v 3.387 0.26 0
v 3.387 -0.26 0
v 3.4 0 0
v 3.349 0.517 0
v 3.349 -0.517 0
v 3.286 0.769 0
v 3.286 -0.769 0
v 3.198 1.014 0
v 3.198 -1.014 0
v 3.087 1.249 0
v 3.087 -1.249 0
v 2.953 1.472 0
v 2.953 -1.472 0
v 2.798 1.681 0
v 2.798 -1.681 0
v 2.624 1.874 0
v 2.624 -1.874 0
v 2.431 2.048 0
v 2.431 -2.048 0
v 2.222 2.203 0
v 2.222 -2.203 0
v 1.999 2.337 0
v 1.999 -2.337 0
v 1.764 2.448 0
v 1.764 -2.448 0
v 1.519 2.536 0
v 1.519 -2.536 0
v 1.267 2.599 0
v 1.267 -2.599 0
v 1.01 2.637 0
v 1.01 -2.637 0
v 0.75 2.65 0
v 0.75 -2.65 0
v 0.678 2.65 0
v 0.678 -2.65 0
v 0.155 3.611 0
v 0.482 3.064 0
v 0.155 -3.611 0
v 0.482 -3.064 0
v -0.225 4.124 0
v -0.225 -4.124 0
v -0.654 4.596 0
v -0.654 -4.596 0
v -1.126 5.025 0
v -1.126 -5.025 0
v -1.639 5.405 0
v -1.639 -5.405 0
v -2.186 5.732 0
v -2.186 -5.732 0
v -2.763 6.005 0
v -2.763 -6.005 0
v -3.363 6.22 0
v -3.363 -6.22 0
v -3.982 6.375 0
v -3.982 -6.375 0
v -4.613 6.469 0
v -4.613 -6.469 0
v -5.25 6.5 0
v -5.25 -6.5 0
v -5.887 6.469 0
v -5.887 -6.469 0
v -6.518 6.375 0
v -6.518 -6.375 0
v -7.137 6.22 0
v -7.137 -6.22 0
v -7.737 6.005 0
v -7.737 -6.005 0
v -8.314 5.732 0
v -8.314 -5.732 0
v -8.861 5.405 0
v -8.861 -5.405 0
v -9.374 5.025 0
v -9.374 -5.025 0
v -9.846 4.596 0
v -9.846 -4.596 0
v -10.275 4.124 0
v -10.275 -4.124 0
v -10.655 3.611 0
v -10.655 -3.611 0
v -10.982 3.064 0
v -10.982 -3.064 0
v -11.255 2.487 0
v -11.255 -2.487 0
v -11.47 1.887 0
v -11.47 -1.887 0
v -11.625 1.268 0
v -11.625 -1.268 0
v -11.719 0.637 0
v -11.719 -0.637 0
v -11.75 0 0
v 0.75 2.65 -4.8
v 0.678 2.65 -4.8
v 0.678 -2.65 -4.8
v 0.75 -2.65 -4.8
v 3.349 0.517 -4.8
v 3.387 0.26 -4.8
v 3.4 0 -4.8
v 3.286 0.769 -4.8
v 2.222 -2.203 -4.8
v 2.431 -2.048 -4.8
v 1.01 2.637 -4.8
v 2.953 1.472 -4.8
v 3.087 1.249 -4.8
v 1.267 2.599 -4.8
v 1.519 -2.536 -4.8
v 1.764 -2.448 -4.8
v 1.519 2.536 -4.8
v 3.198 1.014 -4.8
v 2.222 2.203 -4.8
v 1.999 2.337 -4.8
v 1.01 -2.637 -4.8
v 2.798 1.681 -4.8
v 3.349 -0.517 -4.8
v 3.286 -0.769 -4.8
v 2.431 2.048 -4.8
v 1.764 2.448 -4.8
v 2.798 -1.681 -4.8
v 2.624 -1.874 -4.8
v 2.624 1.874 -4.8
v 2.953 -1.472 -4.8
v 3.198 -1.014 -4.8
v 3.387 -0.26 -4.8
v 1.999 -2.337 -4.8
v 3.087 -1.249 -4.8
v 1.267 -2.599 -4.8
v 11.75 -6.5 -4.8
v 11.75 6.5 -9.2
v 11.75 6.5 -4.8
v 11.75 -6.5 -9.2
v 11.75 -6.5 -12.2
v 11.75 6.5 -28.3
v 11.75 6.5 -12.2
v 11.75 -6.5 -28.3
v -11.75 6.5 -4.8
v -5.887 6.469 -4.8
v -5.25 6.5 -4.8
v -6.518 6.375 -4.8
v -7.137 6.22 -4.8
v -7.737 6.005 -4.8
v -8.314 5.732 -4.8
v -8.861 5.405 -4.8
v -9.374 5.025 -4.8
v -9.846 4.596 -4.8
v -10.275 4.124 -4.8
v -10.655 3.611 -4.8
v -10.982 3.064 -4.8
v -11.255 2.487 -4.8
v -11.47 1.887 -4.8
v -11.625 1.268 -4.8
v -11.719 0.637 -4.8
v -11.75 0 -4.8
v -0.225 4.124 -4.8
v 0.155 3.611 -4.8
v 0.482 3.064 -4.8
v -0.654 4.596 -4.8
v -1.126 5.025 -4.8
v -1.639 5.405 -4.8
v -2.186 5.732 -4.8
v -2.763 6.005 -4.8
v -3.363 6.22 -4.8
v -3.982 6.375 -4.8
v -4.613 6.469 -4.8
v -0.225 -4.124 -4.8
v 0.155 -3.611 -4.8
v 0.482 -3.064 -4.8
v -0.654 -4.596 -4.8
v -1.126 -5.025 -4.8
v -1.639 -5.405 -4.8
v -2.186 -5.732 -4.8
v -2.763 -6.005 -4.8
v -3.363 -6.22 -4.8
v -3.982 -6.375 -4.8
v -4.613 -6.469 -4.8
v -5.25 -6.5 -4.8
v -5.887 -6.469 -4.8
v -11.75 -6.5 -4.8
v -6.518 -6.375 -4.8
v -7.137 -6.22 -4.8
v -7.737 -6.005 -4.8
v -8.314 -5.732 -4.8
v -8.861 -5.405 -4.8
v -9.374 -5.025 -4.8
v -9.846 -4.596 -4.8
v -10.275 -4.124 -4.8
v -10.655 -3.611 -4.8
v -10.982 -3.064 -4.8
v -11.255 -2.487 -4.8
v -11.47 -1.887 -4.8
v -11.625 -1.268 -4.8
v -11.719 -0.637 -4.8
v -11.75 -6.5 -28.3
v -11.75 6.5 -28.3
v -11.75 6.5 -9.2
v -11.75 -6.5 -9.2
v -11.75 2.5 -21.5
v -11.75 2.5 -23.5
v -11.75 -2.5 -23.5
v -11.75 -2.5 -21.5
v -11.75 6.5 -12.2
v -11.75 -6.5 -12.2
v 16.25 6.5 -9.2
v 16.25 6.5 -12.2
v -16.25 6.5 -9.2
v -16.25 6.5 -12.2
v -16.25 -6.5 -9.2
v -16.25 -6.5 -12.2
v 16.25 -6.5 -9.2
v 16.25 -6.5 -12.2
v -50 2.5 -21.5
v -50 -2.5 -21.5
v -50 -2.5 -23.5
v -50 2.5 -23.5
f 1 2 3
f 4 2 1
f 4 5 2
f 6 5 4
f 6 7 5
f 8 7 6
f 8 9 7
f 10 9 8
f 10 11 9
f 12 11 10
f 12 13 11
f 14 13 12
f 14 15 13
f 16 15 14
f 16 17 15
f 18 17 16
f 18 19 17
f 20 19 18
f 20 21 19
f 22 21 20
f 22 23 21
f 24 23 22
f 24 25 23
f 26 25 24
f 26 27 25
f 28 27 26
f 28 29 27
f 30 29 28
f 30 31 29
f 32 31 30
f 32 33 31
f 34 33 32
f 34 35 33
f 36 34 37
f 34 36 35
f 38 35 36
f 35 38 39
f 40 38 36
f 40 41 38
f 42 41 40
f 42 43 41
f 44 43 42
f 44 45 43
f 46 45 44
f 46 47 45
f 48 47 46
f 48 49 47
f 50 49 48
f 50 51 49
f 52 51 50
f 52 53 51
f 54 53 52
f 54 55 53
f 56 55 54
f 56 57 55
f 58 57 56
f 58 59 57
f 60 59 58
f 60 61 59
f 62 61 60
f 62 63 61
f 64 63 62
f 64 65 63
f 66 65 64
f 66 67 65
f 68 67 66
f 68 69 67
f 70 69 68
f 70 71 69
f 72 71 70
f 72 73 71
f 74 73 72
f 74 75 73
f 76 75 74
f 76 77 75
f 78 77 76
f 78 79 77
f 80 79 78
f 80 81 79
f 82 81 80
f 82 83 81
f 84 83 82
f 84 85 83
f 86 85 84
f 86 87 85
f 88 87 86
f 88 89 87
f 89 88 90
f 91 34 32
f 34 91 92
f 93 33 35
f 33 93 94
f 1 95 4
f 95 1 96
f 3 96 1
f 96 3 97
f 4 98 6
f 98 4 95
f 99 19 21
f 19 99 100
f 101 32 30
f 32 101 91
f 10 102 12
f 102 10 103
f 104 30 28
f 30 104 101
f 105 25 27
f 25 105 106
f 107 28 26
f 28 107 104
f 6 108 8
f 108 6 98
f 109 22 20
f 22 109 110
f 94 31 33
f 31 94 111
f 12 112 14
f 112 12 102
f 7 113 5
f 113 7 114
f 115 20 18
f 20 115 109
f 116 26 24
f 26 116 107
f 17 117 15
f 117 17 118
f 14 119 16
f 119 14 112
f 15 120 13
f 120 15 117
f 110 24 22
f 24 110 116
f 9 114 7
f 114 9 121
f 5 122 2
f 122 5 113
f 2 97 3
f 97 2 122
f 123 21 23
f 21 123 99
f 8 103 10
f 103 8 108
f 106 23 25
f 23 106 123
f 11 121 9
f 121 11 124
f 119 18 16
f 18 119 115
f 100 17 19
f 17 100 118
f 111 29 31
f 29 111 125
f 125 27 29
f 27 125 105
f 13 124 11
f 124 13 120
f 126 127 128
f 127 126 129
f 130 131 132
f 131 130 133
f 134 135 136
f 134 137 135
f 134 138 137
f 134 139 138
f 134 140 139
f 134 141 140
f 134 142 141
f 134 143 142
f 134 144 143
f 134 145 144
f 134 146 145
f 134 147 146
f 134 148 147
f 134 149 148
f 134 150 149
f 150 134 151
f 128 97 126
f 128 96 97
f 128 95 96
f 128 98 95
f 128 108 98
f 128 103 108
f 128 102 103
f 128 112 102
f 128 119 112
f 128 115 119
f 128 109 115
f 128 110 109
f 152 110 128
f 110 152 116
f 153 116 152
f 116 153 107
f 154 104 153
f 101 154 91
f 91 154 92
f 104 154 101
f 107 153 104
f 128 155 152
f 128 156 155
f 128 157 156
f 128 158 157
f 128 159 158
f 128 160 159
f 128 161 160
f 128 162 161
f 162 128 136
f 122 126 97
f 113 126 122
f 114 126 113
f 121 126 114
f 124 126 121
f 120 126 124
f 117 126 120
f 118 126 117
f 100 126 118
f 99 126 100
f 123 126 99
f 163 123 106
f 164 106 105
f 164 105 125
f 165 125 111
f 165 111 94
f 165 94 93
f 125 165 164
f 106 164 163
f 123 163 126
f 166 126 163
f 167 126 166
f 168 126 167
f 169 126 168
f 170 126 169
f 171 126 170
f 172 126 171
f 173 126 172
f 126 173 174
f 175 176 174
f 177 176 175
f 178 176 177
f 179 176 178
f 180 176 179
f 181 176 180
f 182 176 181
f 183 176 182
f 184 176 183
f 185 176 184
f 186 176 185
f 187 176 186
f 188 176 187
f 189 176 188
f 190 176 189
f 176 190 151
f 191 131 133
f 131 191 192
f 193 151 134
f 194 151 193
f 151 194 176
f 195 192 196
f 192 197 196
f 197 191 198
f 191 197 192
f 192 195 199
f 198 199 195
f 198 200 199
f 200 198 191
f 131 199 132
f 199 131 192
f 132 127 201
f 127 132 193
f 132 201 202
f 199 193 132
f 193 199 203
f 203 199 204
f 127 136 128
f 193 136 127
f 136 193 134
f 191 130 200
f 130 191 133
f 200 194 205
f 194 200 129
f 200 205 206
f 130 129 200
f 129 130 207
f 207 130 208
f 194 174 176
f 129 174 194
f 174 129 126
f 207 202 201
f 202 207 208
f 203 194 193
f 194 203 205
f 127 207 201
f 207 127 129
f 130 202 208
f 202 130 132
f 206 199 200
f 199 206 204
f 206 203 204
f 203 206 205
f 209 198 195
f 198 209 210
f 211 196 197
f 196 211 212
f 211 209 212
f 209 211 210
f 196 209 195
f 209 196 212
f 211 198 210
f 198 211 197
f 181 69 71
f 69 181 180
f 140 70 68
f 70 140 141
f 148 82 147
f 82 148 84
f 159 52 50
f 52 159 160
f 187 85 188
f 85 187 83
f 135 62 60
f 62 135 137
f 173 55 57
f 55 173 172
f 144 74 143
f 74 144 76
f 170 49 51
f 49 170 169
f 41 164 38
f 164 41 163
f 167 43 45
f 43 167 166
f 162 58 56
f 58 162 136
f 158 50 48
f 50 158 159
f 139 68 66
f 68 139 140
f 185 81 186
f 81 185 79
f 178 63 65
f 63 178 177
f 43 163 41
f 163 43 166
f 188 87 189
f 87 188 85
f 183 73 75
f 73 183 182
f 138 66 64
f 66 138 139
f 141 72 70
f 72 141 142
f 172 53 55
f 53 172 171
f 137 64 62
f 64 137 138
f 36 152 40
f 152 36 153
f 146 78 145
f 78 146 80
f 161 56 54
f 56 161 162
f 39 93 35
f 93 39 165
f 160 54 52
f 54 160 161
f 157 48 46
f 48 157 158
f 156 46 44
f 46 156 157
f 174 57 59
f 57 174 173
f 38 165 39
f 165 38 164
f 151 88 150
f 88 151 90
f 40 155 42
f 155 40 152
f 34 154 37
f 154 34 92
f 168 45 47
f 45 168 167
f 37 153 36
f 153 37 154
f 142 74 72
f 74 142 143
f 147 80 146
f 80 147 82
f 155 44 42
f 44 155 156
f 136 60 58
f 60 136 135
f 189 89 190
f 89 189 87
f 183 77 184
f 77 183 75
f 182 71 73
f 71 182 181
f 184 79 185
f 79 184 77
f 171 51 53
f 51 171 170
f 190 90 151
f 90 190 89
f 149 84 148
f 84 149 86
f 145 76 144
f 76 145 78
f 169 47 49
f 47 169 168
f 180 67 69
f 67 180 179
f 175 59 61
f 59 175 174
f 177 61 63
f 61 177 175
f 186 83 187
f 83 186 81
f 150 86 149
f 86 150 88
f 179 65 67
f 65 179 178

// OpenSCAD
// file: Common/Util/Common/Util/Shapes/Flat_Ring_Segment.scad
// Auther: Tobias Grundtvig
// Date: Oct 1, 2020
//
// A segment of a flat ring

use <Pie_2D.scad>
use <Flat_Ring.scad>

Flat_Ring_Segment(  inner_diameter=20,
                    outer_diameter=25,
                    height=5,
                    from_angle=45,
                    to_angle=135,
                    t_y="neg",
                    angular_resolution=32);

module Flat_Ring_Segment(   inner_diameter,
                            outer_diameter,
                            height,
                            from_angle,
                            to_angle,
                            t_x="center",
                            t_y="center",
                            t_z="center",
                            angular_resolution=32)
{
    tx = t_x == "neg" ? -outer_diameter/2 : 
            t_x == "pos" ? outer_diameter/2 : 0;
    ty = t_y == "neg" ? -outer_diameter/2 : 
            t_y == "pos" ? outer_diameter/2 : 0;
    tz = t_z == "neg" ? -height/2 : 
            t_z == "pos" ? height/2 : 0;
    translate([tx, ty, tz])
    intersection()
    {
        linear_extrude(height=height, center=true)
        {
            Pie_2D
            (
                diameter=outer_diameter*2,
                from_angle=from_angle,
                to_angle=to_angle,
                steps = 8
            );
        }
        Flat_Ring(  inner_diameter=inner_diameter,
                    outer_diameter=outer_diameter,
                    height=height,
                    angular_resolution=angular_resolution);
    }
}
// file: Common/Util/Common/Util/Shapes/Torus_Segment.scad
// Auther: Tobias Grundtvig
// Date: Oct 1, 2020
//
// A segment of a flat ring

use <Pie_2D.scad>
use <Torus.scad>

Torus_Segment(  small_diameter=10,
                big_diameter=40,
                from_angle=45,
                to_angle=90,
                t_y="neg",
                angular_resolution=64);

module Torus_Segment(   small_diameter,
                        big_diameter,
                        from_angle,
                        to_angle,
                        t_x="center",
                        t_y="center",
                        t_z="center",
                        angular_resolution=32)
{
    tx = t_x == "neg" ? -0.5*big_diameter - 0.5*small_diameter : 
            t_x == "pos" ? 0.5*big_diameter + 0.5*small_diameter : 0;
    ty = t_y == "neg" ? -0.5*big_diameter - 0.5*small_diameter : 
            t_y == "pos" ? 0.5*big_diameter + 0.5*small_diameter : 0;
    tz = t_z == "neg" ? -0.5*small_diameter : 
            t_z == "pos" ? 0.5*small_diameter : 0;
    translate([tx, ty, tz])
    intersection()
    {
        linear_extrude(height=small_diameter+2, center=true)
        {
            Pie_2D
            (
                diameter=(small_diameter+big_diameter)*2,
                from_angle=from_angle,
                to_angle=to_angle,
                steps = 8
            );
        }
        Torus(  small_diameter=small_diameter,
                big_diameter=big_diameter,
                angular_resolution=angular_resolution);
    }
}
// file: Common/Util/Common/Util/Shapes/Cone_Segment.scad
// Auther: Tobias Grundtvig
// Date: Oct 1, 2020
//
// A segment of a cone

use <Pie_2D.scad>
use <Cone.scad>

Cone_Segment(bottom_diameter=20, top_diameter=25, height=5, from_angle=45, to_angle=135);

module Cone_Segment(bottom_diameter,
                    top_diameter,
                    height,
                    from_angle,
                    to_angle,
                    t_x="center",
                    t_y="center",
                    t_z="center",
                    angular_resolution=32)
{
    max_d=max(bottom_diameter, top_diameter);
    tx = t_x == "neg" ? -max_d/2 : 
            t_x == "pos" ? max_d/2 : 0;
    ty = t_y == "neg" ? -max_d/2 : 
            t_y == "pos" ? max_d/2 : 0;
    tz = t_z == "neg" ? -height/2 : 
            t_z == "pos" ? height/2 : 0;
    translate([tx, ty, tz])
    intersection()
    {
        linear_extrude(height=height, center=true)
        {
            Pie_2D
            (
                diameter=max(bottom_diameter, top_diameter)*2,
                from_angle=from_angle,
                to_angle=to_angle,
                steps = 8
            );
        }
        Cone(   bottom_diameter=bottom_diameter,
                top_diameter=top_diameter,
                height=height,
                angular_resolution=angular_resolution);
    }
}
// file: Common/Util/Common/Util/Shapes/Cylinder_Segment.scad
// Auther: Tobias Grundtvig
// Date: Oct 1, 2020
//
// A segment of a cylinder

use <Pie_2D.scad>
use <Cylinder.scad>

Cylinder_Segment(diameter=20, height=5, from_angle=45, to_angle=135, t_y="neg", t_z="neg");

module Cylinder_Segment(diameter,
                        height,
                        from_angle,
                        to_angle,
                        t_x="center",
                        t_y="center",
                        t_z="center",
                        angular_resolution=32)
{
    tx = t_x == "neg" ? -diameter/2 : 
            t_x == "pos" ? diameter/2 : 0;
    ty = t_y == "neg" ? -diameter/2 : 
            t_y == "pos" ? diameter/2 : 0;
    tz = t_z == "neg" ? -height/2 : 
            t_z == "pos" ? height/2 : 0;
    translate([tx, ty, tz])
    intersection()
    {
        linear_extrude(height=height, center=true)
        {
            Pie_2D
            (
                diameter=diameter*2,
                from_angle=from_angle,
                to_angle=to_angle,
                steps = 8
            );
        }
        Cylinder(   diameter=diameter,
                    height=height,
                    angular_resolution=angular_resolution);
    }
}
// file: Common/Util/Common/Util/Shapes/Flat_Ring.scad
// Auther: Tobias Grundtvig
// Date: Oct 1, 2020
//
// A flat ring

use  <Cylinder.scad>

Flat_Ring(inner_diameter=20, outer_diameter=25, height=5,t_x="neg", angular_resolution=32);

module Flat_Ring(   inner_diameter,
                    outer_diameter,
                    height,
                    t_x="center",
                    t_y="center",
                    t_z="center",
                    angular_resolution=32)
{
    tx = t_x == "neg" ? -outer_diameter/2 : 
            t_x == "pos" ? outer_diameter/2 : 0;
    ty = t_y == "neg" ? -outer_diameter/2 : 
            t_y == "pos" ? outer_diameter/2 : 0;
    tz = t_z == "neg" ? -height/2 : 
            t_z == "pos" ? height/2 : 0;
    translate([tx, ty, tz])
    difference()
    {
        Cylinder(   diameter=outer_diameter,
                    height=height,
                    angular_resolution=angular_resolution   );
        translate([0,0,-1])
        Cylinder(   diameter=inner_diameter,
                    height=height+3, 
                    angular_resolution=angular_resolution);
    }
}
// file: Common/Util/Common/Util/Shapes/Torus.scad
// Auther: Tobias Grundtvig
// Date: Oct 1, 2020
//
// A Torus

Torus(small_diameter=10, big_diameter=40, t_z="pos", t_y="neg", angular_resolution=64);

module Torus(   small_diameter,
                big_diameter,
                t_x="center",
                t_y="center",
                t_z="center",
                angular_resolution=32)
{
    tx = t_x == "neg" ? -0.5*big_diameter - 0.5*small_diameter : 
            t_x == "pos" ? 0.5*big_diameter + 0.5*small_diameter : 0;
    ty = t_y == "neg" ? -0.5*big_diameter - 0.5*small_diameter : 
            t_y == "pos" ? 0.5*big_diameter + 0.5*small_diameter : 0;
    tz = t_z == "neg" ? -0.5*small_diameter : 
            t_z == "pos" ? 0.5*small_diameter : 0;
    translate([tx, ty, tz])
        rotate_extrude(convexity = 10, $fn=angular_resolution)
            translate([0.5*big_diameter, 0, 0])
                circle(r = 0.5*small_diameter, $fn=angular_resolution);
    
}
// file: Common/Util/Common/Util/Shapes/Cone.scad
// Auther: Tobias Grundtvig
// Date: Oct 1, 2020
//
// A cone, wraps the build-in cylinder module, to get consistent naming

Cone(bottom_diameter=20, top_diameter=10, height=10, t_x="neg");

module Cone(bottom_diameter,
            top_diameter,
            height,
            t_x="center",
            t_y="center",
            t_z="center",
            angular_resolution=32)
{
    max_d = max(bottom_diameter, top_diameter);
    tx = t_x == "neg" ? -max_d/2 : 
            t_x == "pos" ? max_d/2 : 0;
    ty = t_y == "neg" ? -max_d/2 : 
            t_y == "pos" ? max_d/2 : 0;
    tz = t_z == "neg" ? -height/2 : 
            t_z == "pos" ? height/2 : 0;
    translate([tx,ty,tz])
    cylinder(d1=bottom_diameter, d2=top_diameter, h=height, center=true, $fn=angular_resolution);
}
// file: Common/Util/Common/Util/Shapes/Cylinder.scad
// Auther: Tobias Grundtvig
// Date: Oct 1, 2020
//
// A wrapper of the build-in cylinder module, to get consistent naming

Cylinder(diameter=10, height=5, t_x="neg", t_z="pos");

module Cylinder(diameter, height, t_x="center", t_y="center", t_z="center", angular_resolution=32)
{
    tx = t_x == "neg" ? -diameter/2 : 
            t_x == "pos" ? diameter/2 : 0;
    ty = t_y == "neg" ? -diameter/2 : 
            t_y == "pos" ? diameter/2 : 0;
    tz = t_z == "neg" ? -height/2 : 
            t_z == "pos" ? height/2 : 0;
    translate([tx,ty,tz])
        cylinder(d=diameter, h=height, center=true, $fn=angular_resolution);
}
// file: Common/Util/Common/Util/Shapes/Box.scad
// Auther: Tobias Grundtvig
// Date: Oct 1, 2020
//
// A wrapper of the build-in cube module, to get consistent naming

Box([10,20,30], t_x="pos", t_y="neg", t_z="pos");

module Box(dimensions, t_x="center", t_y="center", t_z="center")
{
    tx = t_x == "neg" ? -dimensions[0]/2 : 
            t_x == "pos" ? dimensions[0]/2 : 0;
    ty = t_y == "neg" ? -dimensions[1]/2 : 
            t_y == "pos" ? dimensions[1]/2 : 0;
    tz = t_z == "neg" ? -dimensions[2]/2 : 
            t_z == "pos" ? dimensions[2]/2 : 0;
    translate([tx, ty, tz])
        cube(dimensions, center=true);
}
// file: Common/Util/Common/Util/Shapes/Circle_Segment_2D.scad
// Auther: Tobias Grundtvig
// Date: Oct 1, 2020
//
// A segment of a circle. The segment is cut out of the circle,
// to get the exactsame borderline as the full circle

use <Pie_2D.scad>

Circle_Segment_2D(diameter=10, from_angle=45, to_angle=315);
translate([1,0,0])
Circle_Segment_2D(diameter=10, from_angle=315, to_angle=45);


module Circle_Segment_2D(diameter, from_angle, to_angle, angular_resolution=32)
{
    intersection()
    {
        circle(d=diameter, $fn=angular_resolution);  
        Pie_2D
        (
            diameter=diameter*2,
            from_angle=from_angle,
            to_angle=to_angle,
            steps = 8
        );       
    }
}
// file: Common/Util/Common/Util/Shapes/Pie_2D.scad
// Auther: Tobias Grundtvig
// Date: Oct 1, 2020
//
//  A 2-dimensional pie
//  can be used to linear-extract a 3D Pie


Pie_2D(diameter=10, from_angle=45, to_angle=315, steps=32);
translate([2,0,0])
Pie_2D(diameter=10, from_angle=315, to_angle=45, steps=32);

module Pie_2D(diameter, from_angle, to_angle, steps=32)
{
    step_size = from_angle < to_angle ?
                (to_angle-from_angle)/steps :
                (360 - (from_angle-to_angle))/steps;
    r=diameter/2;
    points = from_angle < to_angle ?
        [
            for(i = [0:steps])
            [r * cos(from_angle+i*step_size), r * sin(from_angle+i*step_size)]
        ] :
        [
            for(i = [0:steps])
            [r * cos(from_angle+i*step_size), r * sin(from_angle+i*step_size)]
        ];
            
    polygon(concat([[0, 0]], points));
}
// file: Common/Util/Shapes.scad
// 2D shapes
use <Common/Util/Shapes/Pie_2D.scad>
use <Common/Util/Shapes/Circle_Segment_2D.scad>


// 3D shapes
use <Common/Util/Shapes/Box.scad>
use <Common/Util/Shapes/Cylinder.scad>
use <Common/Util/Shapes/Cone.scad>
use <Common/Util/Shapes/Torus.scad>
use <Common/Util/Shapes/Flat_Ring.scad>
use <Common/Util/Shapes/Cylinder_Segment.scad>
use <Common/Util/Shapes/Cone_Segment.scad>
use <Common/Util/Shapes/Torus_Segment.scad>
use <Common/Util/Shapes/Flat_Ring_Segment.scad>
// main file
include <Common/Util/Shapes.scad>


//Test();
SG_90_Micro_Servo();

module Test()
{
    difference()
    {
        Box([35,30,7],t_y="neg", t_z="neg");
        rotate([0,180,0])
        rotate([-90,0,0])
        SG_90_Micro_Servo();
    }
}

module SG_90_Micro_Servo()
{
    union()
    {
        translate([0,0,-4.8])
        Box([23.5,13,23.5],t_z="neg");
        translate([0,0,-9.2])
        Box([32.5, 13, 3],t_z="neg");
        translate([0,0,-21.5])
        Box([50,5,2],t_x="neg", t_z="neg");
        translate([-(23.5-13)/2,0,0])
        Cylinder(diameter=13,height=5, t_z="neg", angular_resolution=64);
        translate([-4+(14.5-12.4),0,0])
        union()
        {
            Box([5.3, 5.3,5.3], t_z="neg");
            translate([0.5*5.3,0,0])
            Cylinder(diameter=5.3,height=5, t_z="neg", angular_resolution=64);
        }
    }
}
